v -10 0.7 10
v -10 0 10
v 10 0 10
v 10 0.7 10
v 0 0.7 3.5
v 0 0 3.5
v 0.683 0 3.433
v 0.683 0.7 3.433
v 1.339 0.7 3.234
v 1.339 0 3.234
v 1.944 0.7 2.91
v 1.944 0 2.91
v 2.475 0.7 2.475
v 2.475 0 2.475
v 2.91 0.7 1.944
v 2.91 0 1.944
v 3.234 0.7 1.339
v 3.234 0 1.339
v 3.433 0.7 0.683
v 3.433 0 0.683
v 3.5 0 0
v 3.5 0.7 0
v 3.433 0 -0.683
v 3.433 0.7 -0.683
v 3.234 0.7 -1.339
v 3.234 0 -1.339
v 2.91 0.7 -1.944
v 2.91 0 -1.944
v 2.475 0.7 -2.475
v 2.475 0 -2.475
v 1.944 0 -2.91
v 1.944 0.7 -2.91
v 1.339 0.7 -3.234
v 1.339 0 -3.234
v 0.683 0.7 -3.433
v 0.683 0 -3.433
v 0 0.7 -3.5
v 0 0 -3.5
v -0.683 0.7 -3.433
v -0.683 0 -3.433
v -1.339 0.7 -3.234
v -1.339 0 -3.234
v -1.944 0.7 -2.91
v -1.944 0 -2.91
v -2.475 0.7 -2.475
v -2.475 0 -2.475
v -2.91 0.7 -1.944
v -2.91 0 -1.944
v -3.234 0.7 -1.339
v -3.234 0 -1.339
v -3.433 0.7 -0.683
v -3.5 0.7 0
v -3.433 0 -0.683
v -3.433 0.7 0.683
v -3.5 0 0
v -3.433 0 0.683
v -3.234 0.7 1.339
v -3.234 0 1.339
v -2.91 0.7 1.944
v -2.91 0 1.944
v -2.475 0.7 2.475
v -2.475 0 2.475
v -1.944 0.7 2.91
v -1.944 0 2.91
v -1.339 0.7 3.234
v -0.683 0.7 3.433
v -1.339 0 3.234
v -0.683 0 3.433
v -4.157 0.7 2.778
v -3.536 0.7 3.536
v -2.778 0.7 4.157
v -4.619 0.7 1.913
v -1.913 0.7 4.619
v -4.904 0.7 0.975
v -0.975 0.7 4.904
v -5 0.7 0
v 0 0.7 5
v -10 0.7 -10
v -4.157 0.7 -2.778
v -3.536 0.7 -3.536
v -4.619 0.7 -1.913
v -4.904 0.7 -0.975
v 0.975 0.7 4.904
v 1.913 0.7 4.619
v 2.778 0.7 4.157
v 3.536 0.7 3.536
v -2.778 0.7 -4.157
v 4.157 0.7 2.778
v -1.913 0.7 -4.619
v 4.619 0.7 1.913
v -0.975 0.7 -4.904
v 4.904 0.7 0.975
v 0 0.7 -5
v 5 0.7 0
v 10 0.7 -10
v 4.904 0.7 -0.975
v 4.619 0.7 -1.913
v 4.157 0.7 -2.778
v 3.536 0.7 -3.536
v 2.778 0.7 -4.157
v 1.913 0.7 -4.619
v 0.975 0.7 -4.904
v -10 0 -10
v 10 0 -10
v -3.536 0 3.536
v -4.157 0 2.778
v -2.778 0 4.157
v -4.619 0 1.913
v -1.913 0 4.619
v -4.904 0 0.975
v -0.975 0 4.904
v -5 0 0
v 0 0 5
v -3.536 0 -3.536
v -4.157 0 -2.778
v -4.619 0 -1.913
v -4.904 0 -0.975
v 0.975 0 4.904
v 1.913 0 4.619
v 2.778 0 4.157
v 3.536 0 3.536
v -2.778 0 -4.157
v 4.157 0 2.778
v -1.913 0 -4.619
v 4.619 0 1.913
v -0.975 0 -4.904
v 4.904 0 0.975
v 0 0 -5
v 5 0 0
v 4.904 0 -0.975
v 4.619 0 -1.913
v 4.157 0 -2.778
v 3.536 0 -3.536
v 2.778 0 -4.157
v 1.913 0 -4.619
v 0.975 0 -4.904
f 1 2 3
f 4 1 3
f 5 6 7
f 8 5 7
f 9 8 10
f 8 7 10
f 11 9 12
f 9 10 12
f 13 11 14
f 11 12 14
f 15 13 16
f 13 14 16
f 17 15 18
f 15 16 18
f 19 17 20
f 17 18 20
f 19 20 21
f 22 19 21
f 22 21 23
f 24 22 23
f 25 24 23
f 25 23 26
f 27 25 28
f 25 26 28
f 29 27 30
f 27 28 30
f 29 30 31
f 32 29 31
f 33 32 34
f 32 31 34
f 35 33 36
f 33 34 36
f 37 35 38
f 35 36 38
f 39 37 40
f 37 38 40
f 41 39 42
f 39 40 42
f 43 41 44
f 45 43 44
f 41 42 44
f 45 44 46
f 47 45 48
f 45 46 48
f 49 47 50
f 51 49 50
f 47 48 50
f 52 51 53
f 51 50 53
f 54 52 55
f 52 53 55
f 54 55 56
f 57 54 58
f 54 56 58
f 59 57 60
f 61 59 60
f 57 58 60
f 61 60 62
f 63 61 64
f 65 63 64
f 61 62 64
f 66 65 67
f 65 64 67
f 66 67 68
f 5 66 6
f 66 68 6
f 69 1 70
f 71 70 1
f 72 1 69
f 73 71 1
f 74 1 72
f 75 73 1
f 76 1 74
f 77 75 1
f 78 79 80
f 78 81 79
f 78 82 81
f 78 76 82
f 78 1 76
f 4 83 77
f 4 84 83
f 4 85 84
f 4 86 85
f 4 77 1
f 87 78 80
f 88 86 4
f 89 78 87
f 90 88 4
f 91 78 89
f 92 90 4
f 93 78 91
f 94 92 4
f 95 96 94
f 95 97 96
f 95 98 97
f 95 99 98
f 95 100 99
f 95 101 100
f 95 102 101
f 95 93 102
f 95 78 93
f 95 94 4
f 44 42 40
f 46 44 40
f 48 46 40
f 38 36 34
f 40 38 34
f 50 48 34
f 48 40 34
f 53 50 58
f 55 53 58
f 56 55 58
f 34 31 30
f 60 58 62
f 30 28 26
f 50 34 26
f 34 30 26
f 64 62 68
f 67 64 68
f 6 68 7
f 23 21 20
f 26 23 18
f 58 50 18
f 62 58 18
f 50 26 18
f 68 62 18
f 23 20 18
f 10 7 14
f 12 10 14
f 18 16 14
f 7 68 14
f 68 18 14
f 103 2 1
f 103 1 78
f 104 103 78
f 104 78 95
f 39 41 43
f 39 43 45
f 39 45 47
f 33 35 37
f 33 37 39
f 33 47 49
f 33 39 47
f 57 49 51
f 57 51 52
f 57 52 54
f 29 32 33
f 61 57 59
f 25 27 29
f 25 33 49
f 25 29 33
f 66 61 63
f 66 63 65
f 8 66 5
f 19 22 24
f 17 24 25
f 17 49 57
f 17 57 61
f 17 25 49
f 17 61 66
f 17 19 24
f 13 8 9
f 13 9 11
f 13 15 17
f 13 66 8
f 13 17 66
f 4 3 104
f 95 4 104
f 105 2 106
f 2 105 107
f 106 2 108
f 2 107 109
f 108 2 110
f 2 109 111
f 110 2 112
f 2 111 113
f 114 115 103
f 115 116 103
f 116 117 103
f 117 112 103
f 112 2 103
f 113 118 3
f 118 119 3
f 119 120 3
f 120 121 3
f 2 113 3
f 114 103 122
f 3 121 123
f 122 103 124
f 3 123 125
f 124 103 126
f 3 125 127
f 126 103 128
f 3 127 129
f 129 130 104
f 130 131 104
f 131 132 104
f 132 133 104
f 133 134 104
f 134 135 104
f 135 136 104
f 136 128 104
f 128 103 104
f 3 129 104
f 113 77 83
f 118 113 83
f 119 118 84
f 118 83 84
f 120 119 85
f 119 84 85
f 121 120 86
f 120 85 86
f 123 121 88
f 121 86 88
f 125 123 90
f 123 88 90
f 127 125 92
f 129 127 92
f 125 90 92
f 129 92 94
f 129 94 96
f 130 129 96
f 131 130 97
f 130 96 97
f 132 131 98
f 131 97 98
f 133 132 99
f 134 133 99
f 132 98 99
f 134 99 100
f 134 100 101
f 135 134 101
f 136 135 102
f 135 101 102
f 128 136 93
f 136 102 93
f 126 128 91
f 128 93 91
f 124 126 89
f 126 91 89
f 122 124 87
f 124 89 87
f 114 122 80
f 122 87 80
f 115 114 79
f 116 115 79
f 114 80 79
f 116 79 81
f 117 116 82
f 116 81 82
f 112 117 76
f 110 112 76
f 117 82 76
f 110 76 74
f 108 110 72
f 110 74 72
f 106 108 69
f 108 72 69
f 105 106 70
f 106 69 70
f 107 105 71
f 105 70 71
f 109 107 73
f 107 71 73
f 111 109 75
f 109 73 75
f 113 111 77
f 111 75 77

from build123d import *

# Parameters (mm, degrees)
SKETCH3_W           = 20
SKETCH3_H           = 20
BOSS_EXTRUDE3_DEPTH = 0.7
SKETCH5_R           = 5
CUT_EXTRUDE21_DEPTH = 0.7
SKETCH6_R           = 3.5
BOSS_EXTRUDE4_DEPTH = 0.7


with BuildPart() as part:
    # Sketch3 → Boss-Extrude3 (new body)
    with BuildSketch(Plane(origin=(0, 0, 0), x_dir=(1, 0, 0), z_dir=(0, 1, 0))):
        Rectangle(SKETCH3_W, SKETCH3_H)
    extrude(amount=BOSS_EXTRUDE3_DEPTH)

    # Sketch5 → Cut-Extrude21 (cut)
    with BuildSketch(Plane(origin=(0, 0.7, 0), x_dir=(1, 0, 0), z_dir=(0, 1, 0))):
        with Locations(Location((0, 0, 0), (0, 0, 270))):
            Circle(SKETCH5_R)
    extrude(amount=-CUT_EXTRUDE21_DEPTH, mode=Mode.SUBTRACT)


with BuildPart() as body_2:
    # Sketch6 → Boss-Extrude4 (new body)
    with BuildSketch(Plane(origin=(0, 0, 0), x_dir=(1, 0, 0), z_dir=(0, 1, 0))):
        with Locations(Location((0, 0, 0), (0, 0, 270))):
            Circle(SKETCH6_R)
    extrude(amount=BOSS_EXTRUDE4_DEPTH)


solid = Compound([part.part, body_2.part])
